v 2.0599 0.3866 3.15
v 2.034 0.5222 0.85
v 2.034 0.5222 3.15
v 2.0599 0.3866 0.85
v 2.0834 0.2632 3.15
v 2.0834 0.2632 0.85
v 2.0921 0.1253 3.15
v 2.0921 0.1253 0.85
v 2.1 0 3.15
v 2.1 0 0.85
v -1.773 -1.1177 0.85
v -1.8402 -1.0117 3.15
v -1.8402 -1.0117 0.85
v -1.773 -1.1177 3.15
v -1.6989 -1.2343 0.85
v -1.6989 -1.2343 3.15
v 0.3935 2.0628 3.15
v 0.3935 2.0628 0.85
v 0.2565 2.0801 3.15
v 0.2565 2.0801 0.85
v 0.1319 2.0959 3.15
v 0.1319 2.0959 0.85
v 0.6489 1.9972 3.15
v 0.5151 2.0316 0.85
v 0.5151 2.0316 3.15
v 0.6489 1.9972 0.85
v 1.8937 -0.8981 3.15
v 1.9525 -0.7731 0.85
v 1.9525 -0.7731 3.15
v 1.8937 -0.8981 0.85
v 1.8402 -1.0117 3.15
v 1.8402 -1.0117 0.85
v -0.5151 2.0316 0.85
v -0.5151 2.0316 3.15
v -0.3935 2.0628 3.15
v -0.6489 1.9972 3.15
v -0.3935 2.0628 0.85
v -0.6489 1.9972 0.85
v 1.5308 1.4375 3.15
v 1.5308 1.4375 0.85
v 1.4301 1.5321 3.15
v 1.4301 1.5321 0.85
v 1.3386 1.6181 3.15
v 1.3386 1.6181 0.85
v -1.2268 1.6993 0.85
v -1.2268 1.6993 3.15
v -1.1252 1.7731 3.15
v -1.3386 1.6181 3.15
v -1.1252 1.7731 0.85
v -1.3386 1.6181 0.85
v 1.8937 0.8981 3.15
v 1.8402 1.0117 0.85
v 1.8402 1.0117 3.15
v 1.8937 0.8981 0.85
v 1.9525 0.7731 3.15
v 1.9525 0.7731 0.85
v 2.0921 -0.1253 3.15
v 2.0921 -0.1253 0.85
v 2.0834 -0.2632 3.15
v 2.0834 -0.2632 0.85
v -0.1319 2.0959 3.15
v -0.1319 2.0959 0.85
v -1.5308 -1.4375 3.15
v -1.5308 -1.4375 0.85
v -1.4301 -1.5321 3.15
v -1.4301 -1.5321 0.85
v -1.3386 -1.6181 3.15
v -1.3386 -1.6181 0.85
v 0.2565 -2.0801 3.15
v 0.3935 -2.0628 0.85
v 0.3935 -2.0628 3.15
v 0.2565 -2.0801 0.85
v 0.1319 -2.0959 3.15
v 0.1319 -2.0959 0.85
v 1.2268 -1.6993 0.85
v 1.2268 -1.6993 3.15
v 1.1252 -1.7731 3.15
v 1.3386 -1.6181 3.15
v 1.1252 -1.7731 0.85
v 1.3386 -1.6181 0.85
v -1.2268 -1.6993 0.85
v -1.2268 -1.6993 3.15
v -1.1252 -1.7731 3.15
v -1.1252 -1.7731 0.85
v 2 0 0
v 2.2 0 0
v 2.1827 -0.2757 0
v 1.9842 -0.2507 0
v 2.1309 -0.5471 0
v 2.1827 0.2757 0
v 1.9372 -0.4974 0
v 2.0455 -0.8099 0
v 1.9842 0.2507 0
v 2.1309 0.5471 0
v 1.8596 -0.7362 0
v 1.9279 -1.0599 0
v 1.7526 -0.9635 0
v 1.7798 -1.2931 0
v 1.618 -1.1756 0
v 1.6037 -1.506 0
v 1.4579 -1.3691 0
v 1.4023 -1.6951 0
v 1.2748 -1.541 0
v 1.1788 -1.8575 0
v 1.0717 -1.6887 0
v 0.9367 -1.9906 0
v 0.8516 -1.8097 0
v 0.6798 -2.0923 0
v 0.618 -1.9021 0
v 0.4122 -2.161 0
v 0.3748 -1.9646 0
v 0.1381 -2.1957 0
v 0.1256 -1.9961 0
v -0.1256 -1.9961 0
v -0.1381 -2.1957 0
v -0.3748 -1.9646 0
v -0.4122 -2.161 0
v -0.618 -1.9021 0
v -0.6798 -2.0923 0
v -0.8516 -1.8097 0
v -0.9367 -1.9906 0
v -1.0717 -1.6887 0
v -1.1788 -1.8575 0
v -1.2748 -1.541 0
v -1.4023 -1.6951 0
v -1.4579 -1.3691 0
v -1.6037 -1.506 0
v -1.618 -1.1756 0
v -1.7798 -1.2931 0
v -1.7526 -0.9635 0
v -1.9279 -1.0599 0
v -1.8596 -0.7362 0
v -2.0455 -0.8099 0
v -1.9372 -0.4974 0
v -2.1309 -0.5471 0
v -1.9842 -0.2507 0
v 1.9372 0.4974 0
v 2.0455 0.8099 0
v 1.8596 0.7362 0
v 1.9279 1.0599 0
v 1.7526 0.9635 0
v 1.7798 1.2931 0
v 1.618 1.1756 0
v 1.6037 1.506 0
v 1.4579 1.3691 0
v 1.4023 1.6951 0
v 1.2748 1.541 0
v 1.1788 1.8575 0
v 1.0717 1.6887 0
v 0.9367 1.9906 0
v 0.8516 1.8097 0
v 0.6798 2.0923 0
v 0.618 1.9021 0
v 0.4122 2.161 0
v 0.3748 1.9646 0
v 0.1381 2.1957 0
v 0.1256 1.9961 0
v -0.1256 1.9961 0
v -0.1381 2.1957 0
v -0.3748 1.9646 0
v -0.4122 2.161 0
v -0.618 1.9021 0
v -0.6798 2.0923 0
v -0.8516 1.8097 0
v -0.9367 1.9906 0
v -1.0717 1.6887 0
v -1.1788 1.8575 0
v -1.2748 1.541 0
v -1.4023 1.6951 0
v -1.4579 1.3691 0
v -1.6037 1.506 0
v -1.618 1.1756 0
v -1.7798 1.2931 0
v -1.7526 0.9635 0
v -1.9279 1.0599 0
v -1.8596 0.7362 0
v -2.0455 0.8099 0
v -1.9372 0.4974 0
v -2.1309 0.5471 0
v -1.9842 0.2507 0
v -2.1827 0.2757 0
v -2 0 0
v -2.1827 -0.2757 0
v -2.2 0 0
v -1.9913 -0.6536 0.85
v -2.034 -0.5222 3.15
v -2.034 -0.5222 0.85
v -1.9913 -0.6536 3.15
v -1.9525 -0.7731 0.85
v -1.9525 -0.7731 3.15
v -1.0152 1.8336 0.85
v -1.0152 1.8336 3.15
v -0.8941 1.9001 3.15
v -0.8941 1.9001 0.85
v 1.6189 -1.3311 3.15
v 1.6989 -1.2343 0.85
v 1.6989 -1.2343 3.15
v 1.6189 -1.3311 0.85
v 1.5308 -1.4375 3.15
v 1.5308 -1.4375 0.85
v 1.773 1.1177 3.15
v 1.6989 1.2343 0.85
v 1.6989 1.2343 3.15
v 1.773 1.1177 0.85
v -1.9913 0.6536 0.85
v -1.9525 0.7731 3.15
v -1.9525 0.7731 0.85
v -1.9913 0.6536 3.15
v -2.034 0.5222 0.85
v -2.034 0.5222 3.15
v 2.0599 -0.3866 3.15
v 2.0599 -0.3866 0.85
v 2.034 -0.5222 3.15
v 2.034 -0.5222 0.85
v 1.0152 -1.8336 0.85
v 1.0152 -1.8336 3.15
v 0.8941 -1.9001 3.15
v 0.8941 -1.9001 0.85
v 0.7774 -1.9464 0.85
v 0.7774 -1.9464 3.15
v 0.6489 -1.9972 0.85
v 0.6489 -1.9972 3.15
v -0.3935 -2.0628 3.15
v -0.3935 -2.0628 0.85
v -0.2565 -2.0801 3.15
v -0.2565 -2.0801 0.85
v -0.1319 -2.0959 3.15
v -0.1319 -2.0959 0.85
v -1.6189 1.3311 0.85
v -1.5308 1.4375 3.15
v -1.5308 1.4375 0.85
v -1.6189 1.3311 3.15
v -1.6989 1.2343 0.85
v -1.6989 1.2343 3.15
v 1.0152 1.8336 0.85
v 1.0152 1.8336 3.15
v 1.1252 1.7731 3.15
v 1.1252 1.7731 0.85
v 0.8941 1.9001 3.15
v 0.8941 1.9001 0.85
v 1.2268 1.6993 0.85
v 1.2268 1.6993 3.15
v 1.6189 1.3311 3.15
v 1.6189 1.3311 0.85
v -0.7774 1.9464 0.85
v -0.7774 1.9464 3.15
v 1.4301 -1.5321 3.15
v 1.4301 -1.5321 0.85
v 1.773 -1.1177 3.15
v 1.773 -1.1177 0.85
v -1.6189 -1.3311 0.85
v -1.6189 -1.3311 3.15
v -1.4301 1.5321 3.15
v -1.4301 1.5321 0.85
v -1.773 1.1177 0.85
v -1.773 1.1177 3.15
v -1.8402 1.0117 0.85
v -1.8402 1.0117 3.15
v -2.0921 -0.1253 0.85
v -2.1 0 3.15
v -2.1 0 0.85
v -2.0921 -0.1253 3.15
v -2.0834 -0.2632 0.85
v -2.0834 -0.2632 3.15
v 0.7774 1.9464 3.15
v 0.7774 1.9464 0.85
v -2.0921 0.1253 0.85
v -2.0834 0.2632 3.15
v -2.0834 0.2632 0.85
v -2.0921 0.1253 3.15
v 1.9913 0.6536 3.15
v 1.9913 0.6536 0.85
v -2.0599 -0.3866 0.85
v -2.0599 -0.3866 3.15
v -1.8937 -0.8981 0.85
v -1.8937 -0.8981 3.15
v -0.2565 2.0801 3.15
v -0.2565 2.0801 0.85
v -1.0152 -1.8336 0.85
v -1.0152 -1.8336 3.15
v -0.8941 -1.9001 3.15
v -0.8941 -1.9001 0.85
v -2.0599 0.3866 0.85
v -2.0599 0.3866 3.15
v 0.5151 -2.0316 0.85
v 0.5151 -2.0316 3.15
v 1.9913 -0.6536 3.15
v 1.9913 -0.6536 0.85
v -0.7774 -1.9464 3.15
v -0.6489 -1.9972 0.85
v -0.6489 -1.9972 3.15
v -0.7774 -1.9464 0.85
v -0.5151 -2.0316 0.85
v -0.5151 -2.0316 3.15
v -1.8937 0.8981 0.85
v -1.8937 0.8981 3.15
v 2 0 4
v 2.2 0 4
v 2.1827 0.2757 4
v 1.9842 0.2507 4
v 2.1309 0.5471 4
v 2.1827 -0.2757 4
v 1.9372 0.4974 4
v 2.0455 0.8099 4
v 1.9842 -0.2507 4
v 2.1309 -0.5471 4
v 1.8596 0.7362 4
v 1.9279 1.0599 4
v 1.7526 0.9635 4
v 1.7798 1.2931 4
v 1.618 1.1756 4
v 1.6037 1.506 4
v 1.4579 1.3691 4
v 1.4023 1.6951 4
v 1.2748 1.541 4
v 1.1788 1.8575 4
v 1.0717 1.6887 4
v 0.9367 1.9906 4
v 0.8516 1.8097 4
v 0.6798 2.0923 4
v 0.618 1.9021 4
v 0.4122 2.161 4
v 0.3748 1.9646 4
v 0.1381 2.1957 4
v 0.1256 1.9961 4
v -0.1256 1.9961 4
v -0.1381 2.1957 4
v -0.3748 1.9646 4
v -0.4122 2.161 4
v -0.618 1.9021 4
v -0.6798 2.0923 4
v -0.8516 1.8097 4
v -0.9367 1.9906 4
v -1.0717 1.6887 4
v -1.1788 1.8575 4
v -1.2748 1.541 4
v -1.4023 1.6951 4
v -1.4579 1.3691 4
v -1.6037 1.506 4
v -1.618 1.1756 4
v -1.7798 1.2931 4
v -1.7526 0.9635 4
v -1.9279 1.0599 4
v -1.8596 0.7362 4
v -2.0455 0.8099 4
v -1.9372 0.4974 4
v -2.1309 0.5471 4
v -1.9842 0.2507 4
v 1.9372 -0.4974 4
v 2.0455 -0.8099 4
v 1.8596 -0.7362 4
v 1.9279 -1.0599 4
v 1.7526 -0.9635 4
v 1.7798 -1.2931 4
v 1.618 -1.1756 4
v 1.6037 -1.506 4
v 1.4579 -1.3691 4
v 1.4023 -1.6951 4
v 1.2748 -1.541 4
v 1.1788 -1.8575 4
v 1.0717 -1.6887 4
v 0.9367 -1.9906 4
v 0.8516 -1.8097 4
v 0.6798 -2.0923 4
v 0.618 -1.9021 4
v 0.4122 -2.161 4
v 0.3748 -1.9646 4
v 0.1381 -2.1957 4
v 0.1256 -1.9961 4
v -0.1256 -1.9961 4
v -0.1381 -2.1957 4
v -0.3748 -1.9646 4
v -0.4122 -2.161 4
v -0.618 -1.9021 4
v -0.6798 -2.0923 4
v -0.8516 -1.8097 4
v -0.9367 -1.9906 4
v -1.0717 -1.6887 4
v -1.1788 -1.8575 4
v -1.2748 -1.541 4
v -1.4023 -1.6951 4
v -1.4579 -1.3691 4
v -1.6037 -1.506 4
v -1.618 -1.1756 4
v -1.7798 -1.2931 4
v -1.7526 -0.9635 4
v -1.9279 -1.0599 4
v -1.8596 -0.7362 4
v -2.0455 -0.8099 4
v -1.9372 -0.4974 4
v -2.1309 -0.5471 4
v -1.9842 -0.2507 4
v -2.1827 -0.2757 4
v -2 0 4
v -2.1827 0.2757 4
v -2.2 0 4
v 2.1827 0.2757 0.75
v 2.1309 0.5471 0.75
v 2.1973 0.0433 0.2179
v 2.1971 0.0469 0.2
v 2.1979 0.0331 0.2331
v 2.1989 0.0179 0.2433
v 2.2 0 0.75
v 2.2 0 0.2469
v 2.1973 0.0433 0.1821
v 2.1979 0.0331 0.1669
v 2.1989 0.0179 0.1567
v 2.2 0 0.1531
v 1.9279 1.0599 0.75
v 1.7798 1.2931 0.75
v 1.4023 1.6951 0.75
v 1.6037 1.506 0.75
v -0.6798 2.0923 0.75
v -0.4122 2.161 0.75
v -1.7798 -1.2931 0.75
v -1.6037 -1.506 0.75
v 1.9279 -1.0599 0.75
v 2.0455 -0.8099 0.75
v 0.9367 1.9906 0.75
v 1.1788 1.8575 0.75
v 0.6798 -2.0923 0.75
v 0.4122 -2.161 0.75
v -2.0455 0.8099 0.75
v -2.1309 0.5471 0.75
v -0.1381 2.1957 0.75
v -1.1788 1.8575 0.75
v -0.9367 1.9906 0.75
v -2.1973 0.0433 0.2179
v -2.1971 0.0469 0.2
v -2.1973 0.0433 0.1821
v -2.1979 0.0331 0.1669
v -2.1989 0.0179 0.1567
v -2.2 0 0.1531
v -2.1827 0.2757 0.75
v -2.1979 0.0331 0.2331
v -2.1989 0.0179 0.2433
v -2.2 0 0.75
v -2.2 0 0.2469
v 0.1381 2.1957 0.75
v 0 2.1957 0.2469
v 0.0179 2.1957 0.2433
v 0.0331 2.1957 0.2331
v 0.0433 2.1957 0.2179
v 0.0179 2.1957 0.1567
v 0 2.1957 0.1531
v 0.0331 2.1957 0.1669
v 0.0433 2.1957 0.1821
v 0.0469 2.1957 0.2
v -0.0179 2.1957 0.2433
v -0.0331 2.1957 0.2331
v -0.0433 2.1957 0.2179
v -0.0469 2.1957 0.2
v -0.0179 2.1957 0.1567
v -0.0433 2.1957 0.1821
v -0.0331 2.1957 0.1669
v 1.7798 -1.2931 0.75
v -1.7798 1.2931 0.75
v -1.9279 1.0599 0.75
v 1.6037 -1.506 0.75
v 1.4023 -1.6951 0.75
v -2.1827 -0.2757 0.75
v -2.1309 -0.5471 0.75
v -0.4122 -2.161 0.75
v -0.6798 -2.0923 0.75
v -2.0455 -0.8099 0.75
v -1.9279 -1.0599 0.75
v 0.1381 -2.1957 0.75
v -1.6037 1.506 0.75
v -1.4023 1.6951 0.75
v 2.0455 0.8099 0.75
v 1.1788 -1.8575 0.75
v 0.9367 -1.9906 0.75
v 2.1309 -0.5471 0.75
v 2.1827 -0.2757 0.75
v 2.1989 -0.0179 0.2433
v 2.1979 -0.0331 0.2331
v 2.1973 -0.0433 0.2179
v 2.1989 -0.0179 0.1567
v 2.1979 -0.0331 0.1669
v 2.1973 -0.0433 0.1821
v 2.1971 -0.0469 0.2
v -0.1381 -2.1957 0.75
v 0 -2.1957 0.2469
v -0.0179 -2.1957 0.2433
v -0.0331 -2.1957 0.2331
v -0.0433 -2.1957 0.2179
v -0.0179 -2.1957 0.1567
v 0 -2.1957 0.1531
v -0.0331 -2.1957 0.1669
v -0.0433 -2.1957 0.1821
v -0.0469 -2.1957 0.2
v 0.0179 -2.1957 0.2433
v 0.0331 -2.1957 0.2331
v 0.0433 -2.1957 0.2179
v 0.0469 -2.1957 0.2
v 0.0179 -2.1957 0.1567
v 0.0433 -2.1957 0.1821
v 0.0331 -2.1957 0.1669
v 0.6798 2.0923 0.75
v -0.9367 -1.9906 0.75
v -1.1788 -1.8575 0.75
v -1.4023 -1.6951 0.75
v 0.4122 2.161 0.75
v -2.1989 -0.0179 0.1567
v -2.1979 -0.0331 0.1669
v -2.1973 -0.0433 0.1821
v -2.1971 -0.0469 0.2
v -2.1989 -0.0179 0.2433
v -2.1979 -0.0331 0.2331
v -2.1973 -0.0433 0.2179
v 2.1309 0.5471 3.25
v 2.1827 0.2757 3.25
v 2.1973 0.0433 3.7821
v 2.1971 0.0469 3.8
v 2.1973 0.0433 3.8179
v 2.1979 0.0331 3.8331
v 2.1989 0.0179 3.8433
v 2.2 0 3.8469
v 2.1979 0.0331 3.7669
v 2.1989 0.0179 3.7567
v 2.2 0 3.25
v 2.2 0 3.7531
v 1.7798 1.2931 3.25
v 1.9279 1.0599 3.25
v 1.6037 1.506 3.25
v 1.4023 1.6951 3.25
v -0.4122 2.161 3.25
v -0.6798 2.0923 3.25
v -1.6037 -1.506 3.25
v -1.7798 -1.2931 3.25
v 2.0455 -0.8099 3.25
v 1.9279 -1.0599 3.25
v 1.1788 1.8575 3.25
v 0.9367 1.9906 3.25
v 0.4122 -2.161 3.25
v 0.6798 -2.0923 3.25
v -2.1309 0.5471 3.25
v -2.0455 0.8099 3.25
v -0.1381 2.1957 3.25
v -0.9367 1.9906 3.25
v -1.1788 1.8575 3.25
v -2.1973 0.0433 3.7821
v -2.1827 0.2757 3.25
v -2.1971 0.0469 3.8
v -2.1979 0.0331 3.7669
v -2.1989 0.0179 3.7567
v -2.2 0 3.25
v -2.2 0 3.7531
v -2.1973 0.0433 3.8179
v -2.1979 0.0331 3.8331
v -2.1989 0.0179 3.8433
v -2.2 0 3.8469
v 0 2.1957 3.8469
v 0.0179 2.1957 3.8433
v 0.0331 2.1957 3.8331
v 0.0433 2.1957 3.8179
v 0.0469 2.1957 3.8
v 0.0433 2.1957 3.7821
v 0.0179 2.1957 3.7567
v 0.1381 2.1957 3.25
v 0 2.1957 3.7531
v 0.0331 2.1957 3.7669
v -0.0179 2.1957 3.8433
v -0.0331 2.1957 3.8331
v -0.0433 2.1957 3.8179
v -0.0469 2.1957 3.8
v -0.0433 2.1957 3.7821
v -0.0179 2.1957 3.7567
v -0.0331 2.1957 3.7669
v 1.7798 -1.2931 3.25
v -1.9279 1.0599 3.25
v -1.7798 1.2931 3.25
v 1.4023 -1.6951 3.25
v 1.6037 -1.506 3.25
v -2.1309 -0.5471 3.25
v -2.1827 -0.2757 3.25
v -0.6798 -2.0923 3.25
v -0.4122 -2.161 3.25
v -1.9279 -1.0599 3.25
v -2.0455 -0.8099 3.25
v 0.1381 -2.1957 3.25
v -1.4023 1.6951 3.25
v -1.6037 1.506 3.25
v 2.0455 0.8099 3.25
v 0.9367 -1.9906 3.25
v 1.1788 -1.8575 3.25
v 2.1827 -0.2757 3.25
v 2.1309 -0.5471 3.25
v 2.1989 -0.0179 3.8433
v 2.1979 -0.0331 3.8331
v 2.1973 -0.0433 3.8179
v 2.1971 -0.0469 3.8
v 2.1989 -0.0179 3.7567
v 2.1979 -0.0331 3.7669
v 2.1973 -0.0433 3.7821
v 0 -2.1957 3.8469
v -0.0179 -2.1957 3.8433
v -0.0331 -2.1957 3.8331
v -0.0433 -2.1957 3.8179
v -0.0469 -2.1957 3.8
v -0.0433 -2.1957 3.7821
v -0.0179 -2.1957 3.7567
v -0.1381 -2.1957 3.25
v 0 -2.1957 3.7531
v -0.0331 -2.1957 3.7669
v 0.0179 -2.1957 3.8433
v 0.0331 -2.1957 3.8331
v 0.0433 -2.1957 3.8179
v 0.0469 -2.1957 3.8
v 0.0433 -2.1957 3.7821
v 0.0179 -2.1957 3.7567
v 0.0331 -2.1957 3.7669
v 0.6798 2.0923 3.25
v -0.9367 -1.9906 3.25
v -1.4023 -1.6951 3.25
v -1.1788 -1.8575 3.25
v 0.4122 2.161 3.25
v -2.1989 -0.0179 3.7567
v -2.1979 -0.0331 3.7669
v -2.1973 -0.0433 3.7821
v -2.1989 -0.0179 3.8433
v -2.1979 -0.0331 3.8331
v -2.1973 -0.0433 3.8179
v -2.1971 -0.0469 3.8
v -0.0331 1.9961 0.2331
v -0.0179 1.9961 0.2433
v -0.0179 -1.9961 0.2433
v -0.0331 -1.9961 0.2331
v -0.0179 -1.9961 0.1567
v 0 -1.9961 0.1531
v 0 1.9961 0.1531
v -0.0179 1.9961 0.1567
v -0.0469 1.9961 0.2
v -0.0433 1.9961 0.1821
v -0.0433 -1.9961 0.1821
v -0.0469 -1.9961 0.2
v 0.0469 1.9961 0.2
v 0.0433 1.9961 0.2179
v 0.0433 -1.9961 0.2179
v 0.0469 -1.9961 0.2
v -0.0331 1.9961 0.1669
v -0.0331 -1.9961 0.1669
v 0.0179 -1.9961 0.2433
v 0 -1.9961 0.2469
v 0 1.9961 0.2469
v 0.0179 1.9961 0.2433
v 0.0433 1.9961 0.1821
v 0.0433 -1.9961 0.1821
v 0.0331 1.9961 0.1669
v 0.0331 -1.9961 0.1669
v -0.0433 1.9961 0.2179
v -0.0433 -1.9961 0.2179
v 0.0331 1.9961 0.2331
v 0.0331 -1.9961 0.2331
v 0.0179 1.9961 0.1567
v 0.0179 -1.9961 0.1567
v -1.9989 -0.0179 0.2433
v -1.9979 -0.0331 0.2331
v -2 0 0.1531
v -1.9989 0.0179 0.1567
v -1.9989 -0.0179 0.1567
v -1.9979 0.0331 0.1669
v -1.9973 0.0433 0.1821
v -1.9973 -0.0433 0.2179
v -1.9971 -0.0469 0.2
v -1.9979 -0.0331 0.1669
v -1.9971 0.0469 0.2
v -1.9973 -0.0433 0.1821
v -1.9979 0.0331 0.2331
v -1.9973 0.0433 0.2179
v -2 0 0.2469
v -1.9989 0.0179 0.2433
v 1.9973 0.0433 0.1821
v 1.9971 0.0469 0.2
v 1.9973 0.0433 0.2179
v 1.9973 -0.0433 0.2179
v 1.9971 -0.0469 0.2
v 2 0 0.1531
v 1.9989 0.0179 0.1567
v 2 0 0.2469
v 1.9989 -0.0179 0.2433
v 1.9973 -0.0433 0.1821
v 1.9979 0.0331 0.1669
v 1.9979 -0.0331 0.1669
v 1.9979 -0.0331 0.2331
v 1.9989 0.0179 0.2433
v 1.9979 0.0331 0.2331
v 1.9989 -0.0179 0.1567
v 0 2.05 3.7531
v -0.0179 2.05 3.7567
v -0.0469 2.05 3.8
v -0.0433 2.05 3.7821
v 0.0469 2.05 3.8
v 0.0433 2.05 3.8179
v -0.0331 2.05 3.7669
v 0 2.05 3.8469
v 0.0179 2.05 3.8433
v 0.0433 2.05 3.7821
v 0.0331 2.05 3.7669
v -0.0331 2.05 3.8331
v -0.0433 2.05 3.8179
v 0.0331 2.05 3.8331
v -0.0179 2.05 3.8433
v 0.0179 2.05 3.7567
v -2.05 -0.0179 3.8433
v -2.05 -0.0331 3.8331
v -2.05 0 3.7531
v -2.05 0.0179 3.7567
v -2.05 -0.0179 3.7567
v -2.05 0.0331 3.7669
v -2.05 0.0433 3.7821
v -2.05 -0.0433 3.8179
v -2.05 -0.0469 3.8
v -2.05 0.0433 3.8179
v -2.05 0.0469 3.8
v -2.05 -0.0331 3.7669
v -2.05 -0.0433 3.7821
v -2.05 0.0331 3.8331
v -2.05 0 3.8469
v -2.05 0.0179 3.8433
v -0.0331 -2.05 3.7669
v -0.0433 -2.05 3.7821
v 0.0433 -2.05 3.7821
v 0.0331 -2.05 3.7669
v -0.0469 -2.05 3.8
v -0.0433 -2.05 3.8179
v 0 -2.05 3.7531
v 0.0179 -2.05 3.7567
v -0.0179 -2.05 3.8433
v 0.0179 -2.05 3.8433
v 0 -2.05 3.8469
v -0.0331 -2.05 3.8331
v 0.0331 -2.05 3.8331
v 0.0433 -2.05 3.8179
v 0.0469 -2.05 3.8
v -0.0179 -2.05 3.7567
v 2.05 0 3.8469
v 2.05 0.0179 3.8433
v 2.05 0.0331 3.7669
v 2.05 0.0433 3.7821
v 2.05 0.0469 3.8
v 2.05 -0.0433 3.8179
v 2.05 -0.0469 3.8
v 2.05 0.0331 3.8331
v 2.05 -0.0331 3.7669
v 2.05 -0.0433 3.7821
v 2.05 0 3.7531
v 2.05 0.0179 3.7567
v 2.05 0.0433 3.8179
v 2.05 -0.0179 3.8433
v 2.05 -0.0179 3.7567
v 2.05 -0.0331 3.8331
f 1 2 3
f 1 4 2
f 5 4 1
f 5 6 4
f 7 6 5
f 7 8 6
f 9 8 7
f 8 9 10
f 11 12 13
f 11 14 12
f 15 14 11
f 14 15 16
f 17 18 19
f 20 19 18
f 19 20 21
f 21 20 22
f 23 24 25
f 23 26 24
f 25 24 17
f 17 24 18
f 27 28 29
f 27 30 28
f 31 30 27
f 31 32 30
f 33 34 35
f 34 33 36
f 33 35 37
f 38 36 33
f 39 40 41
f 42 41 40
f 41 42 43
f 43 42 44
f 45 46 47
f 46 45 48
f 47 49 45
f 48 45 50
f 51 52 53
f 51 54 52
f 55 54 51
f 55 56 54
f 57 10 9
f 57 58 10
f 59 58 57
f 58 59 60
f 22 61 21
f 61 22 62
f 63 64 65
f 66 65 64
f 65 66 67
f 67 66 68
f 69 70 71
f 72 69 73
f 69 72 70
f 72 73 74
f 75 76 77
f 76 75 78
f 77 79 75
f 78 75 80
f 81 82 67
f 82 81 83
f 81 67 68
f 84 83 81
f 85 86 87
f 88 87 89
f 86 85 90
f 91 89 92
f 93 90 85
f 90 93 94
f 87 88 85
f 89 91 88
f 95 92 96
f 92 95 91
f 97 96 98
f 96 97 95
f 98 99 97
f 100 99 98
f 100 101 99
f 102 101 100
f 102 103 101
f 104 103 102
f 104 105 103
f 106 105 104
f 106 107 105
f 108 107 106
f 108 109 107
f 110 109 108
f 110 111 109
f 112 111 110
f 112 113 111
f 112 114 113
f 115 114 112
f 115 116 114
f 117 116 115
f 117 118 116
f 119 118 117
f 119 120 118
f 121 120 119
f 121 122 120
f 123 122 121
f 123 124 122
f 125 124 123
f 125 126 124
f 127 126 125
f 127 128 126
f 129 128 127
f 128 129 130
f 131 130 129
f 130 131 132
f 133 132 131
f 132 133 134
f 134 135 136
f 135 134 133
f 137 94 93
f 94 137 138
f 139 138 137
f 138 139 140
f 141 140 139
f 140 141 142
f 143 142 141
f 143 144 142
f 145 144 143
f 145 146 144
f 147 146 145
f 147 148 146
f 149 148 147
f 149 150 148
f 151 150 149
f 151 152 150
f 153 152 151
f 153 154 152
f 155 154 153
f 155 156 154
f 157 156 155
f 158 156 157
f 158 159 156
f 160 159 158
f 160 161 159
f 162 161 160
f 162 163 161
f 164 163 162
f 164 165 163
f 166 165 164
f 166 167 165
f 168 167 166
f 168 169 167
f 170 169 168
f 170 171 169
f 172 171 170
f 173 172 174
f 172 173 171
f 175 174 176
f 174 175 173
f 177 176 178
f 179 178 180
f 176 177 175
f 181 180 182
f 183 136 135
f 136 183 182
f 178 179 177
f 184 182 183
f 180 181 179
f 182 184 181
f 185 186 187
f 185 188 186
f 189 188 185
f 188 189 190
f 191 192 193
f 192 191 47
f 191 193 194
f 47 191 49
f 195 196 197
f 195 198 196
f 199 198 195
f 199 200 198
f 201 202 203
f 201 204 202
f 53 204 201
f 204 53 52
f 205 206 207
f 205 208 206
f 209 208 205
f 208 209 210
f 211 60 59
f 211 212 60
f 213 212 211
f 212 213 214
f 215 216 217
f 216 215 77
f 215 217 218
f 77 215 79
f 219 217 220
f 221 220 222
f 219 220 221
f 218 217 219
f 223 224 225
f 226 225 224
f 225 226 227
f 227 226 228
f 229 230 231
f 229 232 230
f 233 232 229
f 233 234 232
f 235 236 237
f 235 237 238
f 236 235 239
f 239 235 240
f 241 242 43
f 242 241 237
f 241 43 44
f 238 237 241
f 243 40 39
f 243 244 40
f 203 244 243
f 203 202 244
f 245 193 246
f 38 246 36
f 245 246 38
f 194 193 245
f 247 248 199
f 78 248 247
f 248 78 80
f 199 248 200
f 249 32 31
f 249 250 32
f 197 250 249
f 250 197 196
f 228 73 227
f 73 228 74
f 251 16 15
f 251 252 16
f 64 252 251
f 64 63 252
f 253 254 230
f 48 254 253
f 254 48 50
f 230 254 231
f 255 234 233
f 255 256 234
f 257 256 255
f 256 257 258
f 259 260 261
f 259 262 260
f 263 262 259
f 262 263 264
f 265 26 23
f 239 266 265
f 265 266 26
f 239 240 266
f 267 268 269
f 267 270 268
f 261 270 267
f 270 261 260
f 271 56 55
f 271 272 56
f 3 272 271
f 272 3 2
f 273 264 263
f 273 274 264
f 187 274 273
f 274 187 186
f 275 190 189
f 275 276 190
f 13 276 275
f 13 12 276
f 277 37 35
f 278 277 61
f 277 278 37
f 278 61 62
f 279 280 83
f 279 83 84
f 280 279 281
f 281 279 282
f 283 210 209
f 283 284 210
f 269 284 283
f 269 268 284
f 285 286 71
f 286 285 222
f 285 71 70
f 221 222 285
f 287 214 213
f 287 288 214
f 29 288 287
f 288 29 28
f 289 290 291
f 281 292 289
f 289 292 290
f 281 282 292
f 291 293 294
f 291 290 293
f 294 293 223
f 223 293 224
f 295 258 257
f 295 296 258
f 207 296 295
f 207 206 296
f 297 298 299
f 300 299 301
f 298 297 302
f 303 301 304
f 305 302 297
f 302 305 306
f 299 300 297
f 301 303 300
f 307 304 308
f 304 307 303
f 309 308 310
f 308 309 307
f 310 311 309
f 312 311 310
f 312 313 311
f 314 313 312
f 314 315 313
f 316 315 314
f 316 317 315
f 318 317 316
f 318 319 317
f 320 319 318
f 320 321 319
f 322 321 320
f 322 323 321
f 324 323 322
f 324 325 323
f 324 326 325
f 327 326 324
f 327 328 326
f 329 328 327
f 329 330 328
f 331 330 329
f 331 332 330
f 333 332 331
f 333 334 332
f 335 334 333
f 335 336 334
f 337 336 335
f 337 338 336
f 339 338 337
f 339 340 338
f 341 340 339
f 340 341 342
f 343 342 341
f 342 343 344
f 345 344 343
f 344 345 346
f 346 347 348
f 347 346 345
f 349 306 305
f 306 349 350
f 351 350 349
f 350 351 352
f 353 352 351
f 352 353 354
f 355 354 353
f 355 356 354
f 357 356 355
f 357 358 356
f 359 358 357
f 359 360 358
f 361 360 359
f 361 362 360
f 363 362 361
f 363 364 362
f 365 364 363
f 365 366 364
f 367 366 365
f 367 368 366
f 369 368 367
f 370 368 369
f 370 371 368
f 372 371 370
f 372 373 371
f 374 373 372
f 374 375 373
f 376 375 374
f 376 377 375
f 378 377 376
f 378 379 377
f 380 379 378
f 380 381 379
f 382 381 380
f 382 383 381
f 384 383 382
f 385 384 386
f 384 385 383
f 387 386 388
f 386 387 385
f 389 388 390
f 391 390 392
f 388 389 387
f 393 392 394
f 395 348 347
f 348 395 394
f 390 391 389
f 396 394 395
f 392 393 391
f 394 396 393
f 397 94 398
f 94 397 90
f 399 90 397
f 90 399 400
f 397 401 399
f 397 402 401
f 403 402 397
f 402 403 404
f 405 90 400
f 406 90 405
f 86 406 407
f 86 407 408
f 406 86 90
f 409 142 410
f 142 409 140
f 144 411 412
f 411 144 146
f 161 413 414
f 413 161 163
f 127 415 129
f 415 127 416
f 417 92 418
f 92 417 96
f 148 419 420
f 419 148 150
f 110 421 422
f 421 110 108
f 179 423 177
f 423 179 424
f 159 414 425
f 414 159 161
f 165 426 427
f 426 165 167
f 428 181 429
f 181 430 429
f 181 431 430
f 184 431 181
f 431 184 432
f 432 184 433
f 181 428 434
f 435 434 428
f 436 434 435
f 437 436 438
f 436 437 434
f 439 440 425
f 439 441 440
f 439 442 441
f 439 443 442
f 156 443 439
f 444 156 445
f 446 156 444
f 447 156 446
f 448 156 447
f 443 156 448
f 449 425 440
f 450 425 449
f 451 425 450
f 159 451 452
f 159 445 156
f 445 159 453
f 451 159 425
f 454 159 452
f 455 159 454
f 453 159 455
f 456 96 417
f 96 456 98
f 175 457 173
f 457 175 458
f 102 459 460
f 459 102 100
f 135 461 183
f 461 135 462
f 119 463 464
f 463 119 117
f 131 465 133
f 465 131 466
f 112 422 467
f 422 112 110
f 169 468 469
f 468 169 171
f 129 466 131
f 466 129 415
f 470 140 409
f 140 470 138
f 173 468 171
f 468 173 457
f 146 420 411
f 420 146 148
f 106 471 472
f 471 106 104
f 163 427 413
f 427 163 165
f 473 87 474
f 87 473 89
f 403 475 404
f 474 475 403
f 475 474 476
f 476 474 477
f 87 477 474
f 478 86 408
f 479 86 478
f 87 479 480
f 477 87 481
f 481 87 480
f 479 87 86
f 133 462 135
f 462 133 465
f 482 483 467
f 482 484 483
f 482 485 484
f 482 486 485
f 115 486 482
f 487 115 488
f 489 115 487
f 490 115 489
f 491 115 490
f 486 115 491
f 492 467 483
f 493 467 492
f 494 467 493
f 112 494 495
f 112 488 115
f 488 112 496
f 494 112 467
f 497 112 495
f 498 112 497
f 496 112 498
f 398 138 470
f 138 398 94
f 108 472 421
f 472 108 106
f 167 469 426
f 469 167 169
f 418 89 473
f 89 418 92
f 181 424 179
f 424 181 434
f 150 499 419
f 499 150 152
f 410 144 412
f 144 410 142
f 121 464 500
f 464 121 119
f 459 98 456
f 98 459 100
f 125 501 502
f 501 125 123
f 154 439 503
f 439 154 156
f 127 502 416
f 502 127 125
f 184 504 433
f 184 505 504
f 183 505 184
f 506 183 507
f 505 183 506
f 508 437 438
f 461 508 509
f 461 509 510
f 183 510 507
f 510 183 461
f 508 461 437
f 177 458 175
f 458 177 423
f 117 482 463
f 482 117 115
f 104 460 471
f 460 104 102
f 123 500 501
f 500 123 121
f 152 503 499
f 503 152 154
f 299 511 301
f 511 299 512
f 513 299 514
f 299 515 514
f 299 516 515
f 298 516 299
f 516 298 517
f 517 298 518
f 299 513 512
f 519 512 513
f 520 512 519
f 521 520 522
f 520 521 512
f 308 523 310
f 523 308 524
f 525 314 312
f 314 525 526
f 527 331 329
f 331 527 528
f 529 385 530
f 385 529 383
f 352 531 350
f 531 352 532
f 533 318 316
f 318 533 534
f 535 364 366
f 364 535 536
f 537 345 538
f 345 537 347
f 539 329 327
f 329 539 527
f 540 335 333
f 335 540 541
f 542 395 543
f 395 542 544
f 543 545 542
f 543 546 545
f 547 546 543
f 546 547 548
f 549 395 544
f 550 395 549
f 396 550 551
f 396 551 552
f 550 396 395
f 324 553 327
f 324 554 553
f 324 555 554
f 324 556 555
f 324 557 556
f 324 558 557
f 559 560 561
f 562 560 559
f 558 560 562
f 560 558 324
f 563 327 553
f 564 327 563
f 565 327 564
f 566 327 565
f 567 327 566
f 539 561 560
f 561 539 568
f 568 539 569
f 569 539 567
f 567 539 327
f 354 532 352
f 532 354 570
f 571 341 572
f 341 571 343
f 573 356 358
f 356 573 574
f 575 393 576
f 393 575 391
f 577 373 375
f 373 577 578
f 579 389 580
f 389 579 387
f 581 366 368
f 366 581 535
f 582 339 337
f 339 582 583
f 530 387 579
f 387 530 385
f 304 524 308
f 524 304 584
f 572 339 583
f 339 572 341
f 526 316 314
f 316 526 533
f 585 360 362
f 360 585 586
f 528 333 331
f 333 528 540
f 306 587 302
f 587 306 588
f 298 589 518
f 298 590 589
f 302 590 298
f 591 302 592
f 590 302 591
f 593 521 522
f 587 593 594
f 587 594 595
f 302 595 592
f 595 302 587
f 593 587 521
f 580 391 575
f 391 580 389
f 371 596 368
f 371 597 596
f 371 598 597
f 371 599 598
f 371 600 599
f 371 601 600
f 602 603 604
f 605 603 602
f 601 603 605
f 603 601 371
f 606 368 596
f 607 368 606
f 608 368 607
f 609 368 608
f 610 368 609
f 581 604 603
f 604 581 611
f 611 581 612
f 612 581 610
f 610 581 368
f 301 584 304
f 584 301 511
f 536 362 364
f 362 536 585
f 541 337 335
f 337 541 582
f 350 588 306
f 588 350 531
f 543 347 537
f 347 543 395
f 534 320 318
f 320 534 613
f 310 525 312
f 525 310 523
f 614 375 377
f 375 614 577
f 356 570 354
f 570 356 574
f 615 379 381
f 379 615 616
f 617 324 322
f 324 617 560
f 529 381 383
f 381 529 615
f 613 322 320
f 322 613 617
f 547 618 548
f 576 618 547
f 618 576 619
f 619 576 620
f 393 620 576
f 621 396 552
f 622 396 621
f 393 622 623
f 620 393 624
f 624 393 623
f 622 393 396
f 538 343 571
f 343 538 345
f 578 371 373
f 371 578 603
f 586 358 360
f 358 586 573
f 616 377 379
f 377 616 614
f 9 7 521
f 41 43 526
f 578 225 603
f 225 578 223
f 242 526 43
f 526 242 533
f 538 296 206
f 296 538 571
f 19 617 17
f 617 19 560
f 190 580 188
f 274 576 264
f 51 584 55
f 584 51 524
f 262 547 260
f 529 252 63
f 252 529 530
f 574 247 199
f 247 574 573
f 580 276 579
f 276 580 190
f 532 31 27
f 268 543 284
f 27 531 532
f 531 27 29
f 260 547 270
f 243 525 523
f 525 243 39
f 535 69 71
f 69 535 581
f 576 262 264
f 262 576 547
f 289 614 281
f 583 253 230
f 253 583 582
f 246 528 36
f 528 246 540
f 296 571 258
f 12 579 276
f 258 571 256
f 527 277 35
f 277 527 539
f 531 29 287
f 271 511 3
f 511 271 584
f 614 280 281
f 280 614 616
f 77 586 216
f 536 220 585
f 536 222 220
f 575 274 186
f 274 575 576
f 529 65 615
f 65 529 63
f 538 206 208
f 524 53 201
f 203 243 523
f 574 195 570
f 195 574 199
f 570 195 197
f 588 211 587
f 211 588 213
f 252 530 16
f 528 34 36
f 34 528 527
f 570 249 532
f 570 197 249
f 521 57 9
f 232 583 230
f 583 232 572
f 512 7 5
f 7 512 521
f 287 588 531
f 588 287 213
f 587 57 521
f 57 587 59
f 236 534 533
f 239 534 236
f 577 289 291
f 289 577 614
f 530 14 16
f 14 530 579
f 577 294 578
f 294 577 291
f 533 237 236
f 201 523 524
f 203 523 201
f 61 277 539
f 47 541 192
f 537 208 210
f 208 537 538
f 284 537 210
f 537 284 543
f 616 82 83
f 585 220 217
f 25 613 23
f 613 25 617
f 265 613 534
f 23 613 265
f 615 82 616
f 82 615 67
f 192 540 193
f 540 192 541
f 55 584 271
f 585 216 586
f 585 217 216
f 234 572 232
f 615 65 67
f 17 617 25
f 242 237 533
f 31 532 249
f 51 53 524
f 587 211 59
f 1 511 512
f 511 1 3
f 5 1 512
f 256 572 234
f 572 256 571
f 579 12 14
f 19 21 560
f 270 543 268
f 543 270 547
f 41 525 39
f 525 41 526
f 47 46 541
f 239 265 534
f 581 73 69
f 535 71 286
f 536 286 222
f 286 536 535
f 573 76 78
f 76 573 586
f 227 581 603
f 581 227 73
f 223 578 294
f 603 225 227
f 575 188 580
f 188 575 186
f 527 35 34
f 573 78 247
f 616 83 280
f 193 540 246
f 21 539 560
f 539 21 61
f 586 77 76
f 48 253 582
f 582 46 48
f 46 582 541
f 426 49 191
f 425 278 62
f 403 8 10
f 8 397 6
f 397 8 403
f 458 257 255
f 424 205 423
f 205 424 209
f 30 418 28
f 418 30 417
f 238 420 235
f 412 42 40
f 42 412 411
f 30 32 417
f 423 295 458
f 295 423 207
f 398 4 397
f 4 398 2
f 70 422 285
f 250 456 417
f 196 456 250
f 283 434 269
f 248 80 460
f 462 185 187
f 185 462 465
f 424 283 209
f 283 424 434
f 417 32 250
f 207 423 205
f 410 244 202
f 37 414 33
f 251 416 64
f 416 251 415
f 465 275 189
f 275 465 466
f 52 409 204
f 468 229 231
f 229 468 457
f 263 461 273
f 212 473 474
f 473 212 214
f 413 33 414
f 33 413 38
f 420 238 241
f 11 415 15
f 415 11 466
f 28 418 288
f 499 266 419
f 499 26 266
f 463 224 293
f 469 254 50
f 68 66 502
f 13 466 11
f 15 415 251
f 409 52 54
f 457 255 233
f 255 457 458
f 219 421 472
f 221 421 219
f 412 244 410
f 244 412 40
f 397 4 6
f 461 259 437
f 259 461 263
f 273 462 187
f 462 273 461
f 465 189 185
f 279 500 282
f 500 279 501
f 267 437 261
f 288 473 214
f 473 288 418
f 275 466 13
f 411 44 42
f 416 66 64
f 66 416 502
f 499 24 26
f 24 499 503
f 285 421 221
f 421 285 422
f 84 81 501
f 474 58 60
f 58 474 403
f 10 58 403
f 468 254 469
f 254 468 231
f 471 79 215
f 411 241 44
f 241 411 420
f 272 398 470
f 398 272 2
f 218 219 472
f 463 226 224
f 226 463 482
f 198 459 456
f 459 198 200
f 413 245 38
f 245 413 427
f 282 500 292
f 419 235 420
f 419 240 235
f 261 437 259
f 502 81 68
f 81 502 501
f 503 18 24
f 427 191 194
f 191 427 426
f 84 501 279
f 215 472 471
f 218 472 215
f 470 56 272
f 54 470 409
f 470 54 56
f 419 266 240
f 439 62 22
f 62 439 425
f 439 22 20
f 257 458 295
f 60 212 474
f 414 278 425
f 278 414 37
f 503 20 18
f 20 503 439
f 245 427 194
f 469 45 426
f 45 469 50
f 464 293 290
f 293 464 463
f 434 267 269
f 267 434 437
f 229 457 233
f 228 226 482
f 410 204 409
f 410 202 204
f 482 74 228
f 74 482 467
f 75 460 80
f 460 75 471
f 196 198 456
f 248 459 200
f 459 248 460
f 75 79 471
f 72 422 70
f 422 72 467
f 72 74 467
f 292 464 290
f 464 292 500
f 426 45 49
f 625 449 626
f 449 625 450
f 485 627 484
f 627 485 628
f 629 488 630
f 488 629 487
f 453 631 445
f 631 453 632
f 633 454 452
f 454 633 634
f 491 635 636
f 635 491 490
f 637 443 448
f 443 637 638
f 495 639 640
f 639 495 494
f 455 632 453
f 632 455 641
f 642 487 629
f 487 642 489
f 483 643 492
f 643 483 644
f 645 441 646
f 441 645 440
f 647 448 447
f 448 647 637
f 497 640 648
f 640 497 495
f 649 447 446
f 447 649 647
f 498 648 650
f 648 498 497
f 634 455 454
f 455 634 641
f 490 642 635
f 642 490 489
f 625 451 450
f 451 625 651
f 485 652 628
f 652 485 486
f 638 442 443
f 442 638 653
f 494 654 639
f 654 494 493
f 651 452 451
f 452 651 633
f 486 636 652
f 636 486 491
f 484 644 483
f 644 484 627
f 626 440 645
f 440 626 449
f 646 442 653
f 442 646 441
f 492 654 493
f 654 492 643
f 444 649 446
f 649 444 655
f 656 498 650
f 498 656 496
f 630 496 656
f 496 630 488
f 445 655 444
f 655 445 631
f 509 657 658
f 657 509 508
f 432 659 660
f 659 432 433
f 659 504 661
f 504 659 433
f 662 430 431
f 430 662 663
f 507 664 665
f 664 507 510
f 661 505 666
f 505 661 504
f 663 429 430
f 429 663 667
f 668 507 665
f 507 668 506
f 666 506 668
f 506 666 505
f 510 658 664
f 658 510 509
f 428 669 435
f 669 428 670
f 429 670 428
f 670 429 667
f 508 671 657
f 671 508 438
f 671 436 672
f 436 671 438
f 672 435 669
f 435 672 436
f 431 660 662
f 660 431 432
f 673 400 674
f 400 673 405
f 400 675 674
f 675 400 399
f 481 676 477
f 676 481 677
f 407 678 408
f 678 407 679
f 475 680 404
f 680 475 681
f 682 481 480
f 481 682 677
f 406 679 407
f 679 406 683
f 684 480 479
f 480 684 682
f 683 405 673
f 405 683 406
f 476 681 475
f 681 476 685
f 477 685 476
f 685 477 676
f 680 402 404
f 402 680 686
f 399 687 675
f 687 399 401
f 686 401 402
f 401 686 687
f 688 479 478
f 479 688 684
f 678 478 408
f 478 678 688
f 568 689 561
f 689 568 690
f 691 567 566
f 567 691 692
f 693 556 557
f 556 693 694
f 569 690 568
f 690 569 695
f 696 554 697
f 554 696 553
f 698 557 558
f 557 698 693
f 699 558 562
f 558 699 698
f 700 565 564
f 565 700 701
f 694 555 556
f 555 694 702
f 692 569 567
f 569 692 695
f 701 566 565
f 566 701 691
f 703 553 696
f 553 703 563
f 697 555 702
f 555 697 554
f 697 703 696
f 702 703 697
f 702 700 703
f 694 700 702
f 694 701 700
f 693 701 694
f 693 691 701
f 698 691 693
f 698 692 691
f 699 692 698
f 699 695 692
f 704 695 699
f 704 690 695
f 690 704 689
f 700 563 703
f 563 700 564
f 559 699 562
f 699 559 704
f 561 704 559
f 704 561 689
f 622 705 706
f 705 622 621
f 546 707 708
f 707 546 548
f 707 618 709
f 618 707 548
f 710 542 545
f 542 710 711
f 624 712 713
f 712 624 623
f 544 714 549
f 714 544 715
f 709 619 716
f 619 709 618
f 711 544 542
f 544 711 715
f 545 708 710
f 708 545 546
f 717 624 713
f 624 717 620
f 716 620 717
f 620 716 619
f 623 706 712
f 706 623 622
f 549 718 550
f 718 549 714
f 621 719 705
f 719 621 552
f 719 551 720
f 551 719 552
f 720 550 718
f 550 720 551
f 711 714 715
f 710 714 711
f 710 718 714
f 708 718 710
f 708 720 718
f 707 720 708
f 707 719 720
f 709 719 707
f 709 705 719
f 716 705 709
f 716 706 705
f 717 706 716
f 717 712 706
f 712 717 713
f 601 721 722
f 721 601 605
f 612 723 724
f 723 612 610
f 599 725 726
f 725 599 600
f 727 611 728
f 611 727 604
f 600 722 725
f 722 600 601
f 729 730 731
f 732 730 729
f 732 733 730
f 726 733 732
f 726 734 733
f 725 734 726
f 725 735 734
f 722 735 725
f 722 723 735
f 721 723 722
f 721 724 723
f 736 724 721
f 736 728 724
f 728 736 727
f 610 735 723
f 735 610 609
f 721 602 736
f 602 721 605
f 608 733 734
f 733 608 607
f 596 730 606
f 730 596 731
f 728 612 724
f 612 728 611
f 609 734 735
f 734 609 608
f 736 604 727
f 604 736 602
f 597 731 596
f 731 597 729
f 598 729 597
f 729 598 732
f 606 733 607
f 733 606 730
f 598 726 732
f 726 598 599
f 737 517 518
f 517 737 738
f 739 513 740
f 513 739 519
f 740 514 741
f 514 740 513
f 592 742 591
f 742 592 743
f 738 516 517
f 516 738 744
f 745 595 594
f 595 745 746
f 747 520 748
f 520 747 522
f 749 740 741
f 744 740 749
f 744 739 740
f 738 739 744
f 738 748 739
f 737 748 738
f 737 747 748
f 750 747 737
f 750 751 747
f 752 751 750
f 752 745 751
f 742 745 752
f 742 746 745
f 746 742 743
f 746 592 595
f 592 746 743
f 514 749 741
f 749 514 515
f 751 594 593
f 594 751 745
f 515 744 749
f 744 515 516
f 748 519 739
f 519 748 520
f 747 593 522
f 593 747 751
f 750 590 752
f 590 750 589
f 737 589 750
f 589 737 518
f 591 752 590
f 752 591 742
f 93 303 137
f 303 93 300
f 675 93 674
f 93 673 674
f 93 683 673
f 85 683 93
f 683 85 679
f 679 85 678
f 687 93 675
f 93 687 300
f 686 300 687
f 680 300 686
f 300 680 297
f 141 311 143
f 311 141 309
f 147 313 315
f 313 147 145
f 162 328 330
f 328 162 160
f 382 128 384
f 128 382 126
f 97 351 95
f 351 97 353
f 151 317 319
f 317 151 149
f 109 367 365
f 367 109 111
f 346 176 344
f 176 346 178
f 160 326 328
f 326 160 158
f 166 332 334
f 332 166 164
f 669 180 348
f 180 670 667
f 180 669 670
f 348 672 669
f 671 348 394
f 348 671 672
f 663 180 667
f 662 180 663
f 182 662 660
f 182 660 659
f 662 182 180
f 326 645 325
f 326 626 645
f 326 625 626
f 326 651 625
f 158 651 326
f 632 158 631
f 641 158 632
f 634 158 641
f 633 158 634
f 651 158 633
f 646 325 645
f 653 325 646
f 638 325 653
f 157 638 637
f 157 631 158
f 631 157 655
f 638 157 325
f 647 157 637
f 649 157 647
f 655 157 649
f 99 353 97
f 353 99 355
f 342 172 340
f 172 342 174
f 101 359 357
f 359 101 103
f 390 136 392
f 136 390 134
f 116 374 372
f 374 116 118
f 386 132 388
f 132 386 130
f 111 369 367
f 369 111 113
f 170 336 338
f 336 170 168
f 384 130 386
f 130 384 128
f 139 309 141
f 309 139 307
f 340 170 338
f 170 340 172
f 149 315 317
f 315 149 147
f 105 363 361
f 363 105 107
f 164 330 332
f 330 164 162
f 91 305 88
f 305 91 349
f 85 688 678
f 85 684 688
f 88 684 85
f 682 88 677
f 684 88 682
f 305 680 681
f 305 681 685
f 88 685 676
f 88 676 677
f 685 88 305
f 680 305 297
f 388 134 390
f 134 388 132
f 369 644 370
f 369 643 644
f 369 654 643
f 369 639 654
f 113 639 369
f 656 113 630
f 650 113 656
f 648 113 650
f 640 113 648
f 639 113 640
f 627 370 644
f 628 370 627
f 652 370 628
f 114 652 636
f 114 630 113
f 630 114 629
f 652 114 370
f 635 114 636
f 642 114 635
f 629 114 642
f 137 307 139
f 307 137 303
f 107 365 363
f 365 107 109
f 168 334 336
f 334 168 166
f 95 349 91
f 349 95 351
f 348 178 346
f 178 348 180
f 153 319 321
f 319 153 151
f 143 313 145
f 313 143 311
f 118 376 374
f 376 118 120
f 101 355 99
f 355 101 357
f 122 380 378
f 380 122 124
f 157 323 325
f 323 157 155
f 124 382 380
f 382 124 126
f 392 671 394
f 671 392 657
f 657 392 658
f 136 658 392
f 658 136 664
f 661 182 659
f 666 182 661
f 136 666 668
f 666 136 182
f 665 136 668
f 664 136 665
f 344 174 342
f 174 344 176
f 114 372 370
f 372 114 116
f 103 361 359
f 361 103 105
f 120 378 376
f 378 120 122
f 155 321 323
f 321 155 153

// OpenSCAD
length=4;
InnerDiameter=4;
radius=InnerDiameter/2;
//If wallThickness is larger than brimThickness than there will not be a brim.
wallThickness=0.1;
brimThickness=0.2;
brimLength=0.75;
//These holes were put in to be tapped. This is the mounting mechanism. Set holeDiameter to 0.0 if you do not want them.
holeDiameter=.09375;
holeOffset=.2;
numberOfHoles=4;
//Set to 0 if you do not want holes at the top of the lens hood. These were put in as a plan B should the holes at the bottom strip.
topHoles=1;
//Resolution
res=50;

difference()
{
	union()
	{
	cylinder(r=radius+wallThickness,h=length,$fn=res);
	cylinder(r=radius+brimThickness,h=brimLength,$fn=res);
	translate([0,0,length-brimLength])cylinder(r=radius+brimThickness,h=brimLength,$fn=res);
	translate([0,0,length-brimLength-brimThickness])
	cylinder(r=radius,r2=radius+brimThickness,h=brimThickness,$fn=res);
	translate([0,0,brimLength])
	cylinder(r=radius+brimThickness,r2=radius,h=brimThickness,$fn=res);
	}
	for(k=[0:topHoles])
	translate([0,0,k*(length-holeOffset*2)])
		{
		for(i=[1:numberOfHoles])
		rotate([0,0,i*360/numberOfHoles])
		translate([k*(radius+0.05),0,holeOffset])rotate([0,90,0])
		cylinder(h=radius+brimThickness+0.1,r=holeDiameter/2,$fn=res/3);
		}
	translate([0,0,-0.1])cylinder(r=radius,h=length+0.2,$fn=res);
}
